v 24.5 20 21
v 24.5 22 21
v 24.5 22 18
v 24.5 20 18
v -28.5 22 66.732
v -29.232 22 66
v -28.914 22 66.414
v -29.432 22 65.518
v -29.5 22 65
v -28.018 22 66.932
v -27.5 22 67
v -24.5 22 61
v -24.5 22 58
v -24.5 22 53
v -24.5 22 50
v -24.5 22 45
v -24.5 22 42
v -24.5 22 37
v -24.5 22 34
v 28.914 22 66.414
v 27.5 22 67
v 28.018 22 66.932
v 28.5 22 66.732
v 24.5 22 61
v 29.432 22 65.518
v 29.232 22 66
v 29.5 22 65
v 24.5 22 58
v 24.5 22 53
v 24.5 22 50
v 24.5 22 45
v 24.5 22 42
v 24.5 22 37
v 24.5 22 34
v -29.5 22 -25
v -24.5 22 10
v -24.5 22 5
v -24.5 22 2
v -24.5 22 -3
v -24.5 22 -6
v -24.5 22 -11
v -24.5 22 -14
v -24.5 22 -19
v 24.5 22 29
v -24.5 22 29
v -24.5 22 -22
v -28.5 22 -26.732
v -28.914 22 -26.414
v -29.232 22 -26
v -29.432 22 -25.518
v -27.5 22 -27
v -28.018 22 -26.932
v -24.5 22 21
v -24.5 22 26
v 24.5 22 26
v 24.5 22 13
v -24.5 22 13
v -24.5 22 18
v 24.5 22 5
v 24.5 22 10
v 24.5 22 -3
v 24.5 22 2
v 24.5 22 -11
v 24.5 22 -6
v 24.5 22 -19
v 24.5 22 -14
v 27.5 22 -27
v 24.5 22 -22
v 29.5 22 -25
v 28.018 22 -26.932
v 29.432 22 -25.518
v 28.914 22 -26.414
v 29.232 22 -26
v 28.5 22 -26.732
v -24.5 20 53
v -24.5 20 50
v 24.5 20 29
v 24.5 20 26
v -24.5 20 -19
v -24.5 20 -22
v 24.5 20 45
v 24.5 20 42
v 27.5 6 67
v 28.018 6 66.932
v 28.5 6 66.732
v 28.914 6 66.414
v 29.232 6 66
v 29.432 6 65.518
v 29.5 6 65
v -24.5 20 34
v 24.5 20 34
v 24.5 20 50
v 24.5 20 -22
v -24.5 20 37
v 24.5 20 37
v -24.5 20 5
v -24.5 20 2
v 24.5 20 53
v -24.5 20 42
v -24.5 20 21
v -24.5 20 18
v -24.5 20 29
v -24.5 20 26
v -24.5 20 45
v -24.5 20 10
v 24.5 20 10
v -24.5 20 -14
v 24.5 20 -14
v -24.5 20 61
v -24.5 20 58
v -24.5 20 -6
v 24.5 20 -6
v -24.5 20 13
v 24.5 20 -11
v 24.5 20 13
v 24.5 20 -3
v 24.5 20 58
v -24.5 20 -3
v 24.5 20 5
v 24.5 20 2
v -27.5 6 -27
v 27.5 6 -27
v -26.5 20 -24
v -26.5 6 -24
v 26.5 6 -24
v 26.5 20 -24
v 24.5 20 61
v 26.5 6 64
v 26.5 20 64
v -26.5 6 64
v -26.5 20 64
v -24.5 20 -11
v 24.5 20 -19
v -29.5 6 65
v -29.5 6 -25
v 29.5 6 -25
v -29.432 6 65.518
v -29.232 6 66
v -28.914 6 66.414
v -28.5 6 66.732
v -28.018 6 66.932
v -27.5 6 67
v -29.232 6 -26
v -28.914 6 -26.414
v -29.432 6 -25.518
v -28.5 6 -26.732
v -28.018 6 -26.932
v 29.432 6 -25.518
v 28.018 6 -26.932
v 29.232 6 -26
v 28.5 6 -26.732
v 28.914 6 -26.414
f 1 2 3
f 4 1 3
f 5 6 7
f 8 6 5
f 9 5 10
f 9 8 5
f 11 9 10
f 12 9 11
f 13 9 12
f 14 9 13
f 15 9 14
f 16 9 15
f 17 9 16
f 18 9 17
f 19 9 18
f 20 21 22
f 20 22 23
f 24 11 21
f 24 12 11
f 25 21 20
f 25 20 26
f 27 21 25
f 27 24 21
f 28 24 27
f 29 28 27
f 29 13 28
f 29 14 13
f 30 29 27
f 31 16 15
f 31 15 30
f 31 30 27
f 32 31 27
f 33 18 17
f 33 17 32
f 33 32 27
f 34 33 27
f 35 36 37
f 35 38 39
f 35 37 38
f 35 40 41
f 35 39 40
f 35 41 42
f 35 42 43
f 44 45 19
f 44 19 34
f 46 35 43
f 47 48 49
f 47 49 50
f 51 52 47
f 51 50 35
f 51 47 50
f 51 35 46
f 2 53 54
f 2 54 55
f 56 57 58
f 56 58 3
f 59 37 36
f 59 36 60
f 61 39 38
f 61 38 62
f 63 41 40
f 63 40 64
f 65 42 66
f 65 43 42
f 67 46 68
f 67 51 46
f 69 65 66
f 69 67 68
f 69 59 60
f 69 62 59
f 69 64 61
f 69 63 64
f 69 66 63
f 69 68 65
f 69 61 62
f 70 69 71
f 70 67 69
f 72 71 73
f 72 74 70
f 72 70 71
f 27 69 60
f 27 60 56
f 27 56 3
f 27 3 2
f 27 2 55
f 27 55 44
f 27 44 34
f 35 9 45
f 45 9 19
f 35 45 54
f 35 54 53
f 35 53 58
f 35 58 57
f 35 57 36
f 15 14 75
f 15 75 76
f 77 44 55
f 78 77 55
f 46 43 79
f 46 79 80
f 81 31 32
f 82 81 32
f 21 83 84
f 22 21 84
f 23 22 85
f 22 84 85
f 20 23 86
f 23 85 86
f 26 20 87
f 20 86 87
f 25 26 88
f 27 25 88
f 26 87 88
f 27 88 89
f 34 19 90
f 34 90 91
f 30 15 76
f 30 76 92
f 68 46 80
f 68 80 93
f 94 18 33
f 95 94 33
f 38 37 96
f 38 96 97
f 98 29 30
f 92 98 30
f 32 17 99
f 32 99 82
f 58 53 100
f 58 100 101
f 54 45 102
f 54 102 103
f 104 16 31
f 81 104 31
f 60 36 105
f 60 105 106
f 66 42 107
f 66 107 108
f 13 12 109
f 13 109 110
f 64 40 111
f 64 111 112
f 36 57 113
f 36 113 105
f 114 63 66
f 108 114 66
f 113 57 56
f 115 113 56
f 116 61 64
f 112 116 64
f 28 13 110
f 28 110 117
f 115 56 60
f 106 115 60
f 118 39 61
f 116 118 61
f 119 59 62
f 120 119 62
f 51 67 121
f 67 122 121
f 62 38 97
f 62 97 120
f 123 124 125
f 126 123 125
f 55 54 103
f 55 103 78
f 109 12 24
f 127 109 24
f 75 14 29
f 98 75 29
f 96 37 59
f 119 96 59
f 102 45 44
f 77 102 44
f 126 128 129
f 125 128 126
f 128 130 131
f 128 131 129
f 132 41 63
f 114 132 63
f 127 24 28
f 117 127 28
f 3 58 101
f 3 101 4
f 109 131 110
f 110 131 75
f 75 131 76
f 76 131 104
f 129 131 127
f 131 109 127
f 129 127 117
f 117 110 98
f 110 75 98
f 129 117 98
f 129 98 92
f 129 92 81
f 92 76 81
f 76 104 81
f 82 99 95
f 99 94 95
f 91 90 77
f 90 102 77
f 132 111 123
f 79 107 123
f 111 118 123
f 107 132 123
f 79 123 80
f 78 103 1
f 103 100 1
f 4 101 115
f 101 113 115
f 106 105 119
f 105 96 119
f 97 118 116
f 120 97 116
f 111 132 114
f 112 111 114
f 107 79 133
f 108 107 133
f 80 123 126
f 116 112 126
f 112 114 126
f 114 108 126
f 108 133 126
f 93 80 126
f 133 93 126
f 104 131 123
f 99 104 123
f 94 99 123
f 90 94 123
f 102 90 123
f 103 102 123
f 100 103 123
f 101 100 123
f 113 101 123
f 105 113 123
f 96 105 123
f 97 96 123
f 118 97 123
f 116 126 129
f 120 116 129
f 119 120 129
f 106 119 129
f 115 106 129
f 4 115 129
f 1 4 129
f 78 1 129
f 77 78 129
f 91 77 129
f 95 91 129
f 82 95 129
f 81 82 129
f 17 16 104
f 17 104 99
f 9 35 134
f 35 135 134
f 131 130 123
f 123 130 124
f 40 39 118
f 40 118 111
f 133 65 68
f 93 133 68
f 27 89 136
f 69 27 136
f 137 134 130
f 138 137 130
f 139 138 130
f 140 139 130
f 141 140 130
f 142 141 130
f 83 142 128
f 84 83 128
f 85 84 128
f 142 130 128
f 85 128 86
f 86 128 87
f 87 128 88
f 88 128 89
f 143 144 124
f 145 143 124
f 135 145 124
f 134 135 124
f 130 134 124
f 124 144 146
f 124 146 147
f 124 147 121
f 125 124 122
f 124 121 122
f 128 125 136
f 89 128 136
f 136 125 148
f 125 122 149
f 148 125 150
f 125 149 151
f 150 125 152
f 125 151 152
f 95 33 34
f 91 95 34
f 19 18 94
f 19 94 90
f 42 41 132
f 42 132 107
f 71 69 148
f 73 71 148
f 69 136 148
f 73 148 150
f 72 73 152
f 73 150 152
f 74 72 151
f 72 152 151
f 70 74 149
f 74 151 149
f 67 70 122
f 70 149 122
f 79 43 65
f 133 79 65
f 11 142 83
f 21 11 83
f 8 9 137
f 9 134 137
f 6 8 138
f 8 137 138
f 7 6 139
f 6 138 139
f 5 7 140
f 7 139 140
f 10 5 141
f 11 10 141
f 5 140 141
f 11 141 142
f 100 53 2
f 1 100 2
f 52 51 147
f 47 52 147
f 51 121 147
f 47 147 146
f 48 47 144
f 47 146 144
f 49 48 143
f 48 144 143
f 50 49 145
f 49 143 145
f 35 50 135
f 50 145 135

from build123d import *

# Parameters (mm, degrees)
BOSS_EXTRUDE1_DEPTH      = 5
BOSS_EXTRUDE1_DEPTH_BACK = 9
SKETCH1_W                = 53
SKETCH1_H                = 88
BOSS_EXTRUDE3_DEPTH      = 2
SKETCH7_W                = 49
SKETCH7_H                = 3
CUT_EXTRUDE3_DEPTH       = 75.934971809
LPATTERN1_COUNT          = 11
LPATTERN1_PITCH          = 8


with BuildPart() as part:
    # Sketch1 → Boss-Extrude1 (new, two sides: drawn at the far end of the back side and taken through both)
    with BuildSketch(Plane(origin=(0, 15, 0), x_dir=(1, 0, 0), z_dir=(0, 1, 0)).offset(-BOSS_EXTRUDE1_DEPTH_BACK)):
        with BuildLine():
            Line((29.5, -65), (29.5, 25))
            ThreePointArc((29.5, 25), (28.914213562, 26.414213562), (27.5, 27))
            Line((27.5, 27), (-27.5, 27))
            ThreePointArc((-27.5, 27), (-28.914213562, 26.414213562), (-29.5, 25))
            Line((-29.5, 25), (-29.5, -65))
            ThreePointArc((-29.5, -65), (-28.914213562, -66.414213562), (-27.5, -67))
            Line((-27.5, -67), (27.5, -67))
            ThreePointArc((27.5, -67), (28.914213562, -66.414213562), (29.5, -65))
        make_face()
        with Locations((0, -20)):
            Rectangle(SKETCH1_W, SKETCH1_H, mode=Mode.SUBTRACT)
    extrude(amount=BOSS_EXTRUDE1_DEPTH + BOSS_EXTRUDE1_DEPTH_BACK)

    # Sketch2 → Boss-Extrude3 (add)
    with BuildSketch(Plane(origin=(0, 20, 0), x_dir=(1, 0, 0), z_dir=(0, 1, 0))):
        with BuildLine():
            Line((29.5, -65), (29.5, 25))
            ThreePointArc((29.5, 25), (28.914213562, 26.414213562), (27.5, 27))
            Line((27.5, 27), (-27.5, 27))
            ThreePointArc((-27.5, 27), (-28.914213562, 26.414213562), (-29.5, 25))
            Line((-29.5, 25), (-29.5, -65))
            ThreePointArc((-29.5, -65), (-28.914213562, -66.414213562), (-27.5, -67))
            Line((-27.5, -67), (27.5, -67))
            ThreePointArc((27.5, -67), (28.914213562, -66.414213562), (29.5, -65))
        make_face()
    extrude(amount=BOSS_EXTRUDE3_DEPTH)

    # Sketch7 → Cut-Extrude3 (cut, through all)
    with BuildSketch(Plane(origin=(0, 22, 0), x_dir=(1, 0, 0), z_dir=(0, 1, 0))):
        with Locations((0, 20.5)):
            Rectangle(SKETCH7_W, SKETCH7_H)
    cut_extrude3 = extrude(amount=-CUT_EXTRUDE3_DEPTH, mode=Mode.SUBTRACT)

    # LPattern1: Cut-Extrude3 ×11
    with Locations(*[(0, 0, i * LPATTERN1_PITCH) for i in range(1, LPATTERN1_COUNT)]):
        add(cut_extrude3, mode=Mode.SUBTRACT)


solid = part.part
